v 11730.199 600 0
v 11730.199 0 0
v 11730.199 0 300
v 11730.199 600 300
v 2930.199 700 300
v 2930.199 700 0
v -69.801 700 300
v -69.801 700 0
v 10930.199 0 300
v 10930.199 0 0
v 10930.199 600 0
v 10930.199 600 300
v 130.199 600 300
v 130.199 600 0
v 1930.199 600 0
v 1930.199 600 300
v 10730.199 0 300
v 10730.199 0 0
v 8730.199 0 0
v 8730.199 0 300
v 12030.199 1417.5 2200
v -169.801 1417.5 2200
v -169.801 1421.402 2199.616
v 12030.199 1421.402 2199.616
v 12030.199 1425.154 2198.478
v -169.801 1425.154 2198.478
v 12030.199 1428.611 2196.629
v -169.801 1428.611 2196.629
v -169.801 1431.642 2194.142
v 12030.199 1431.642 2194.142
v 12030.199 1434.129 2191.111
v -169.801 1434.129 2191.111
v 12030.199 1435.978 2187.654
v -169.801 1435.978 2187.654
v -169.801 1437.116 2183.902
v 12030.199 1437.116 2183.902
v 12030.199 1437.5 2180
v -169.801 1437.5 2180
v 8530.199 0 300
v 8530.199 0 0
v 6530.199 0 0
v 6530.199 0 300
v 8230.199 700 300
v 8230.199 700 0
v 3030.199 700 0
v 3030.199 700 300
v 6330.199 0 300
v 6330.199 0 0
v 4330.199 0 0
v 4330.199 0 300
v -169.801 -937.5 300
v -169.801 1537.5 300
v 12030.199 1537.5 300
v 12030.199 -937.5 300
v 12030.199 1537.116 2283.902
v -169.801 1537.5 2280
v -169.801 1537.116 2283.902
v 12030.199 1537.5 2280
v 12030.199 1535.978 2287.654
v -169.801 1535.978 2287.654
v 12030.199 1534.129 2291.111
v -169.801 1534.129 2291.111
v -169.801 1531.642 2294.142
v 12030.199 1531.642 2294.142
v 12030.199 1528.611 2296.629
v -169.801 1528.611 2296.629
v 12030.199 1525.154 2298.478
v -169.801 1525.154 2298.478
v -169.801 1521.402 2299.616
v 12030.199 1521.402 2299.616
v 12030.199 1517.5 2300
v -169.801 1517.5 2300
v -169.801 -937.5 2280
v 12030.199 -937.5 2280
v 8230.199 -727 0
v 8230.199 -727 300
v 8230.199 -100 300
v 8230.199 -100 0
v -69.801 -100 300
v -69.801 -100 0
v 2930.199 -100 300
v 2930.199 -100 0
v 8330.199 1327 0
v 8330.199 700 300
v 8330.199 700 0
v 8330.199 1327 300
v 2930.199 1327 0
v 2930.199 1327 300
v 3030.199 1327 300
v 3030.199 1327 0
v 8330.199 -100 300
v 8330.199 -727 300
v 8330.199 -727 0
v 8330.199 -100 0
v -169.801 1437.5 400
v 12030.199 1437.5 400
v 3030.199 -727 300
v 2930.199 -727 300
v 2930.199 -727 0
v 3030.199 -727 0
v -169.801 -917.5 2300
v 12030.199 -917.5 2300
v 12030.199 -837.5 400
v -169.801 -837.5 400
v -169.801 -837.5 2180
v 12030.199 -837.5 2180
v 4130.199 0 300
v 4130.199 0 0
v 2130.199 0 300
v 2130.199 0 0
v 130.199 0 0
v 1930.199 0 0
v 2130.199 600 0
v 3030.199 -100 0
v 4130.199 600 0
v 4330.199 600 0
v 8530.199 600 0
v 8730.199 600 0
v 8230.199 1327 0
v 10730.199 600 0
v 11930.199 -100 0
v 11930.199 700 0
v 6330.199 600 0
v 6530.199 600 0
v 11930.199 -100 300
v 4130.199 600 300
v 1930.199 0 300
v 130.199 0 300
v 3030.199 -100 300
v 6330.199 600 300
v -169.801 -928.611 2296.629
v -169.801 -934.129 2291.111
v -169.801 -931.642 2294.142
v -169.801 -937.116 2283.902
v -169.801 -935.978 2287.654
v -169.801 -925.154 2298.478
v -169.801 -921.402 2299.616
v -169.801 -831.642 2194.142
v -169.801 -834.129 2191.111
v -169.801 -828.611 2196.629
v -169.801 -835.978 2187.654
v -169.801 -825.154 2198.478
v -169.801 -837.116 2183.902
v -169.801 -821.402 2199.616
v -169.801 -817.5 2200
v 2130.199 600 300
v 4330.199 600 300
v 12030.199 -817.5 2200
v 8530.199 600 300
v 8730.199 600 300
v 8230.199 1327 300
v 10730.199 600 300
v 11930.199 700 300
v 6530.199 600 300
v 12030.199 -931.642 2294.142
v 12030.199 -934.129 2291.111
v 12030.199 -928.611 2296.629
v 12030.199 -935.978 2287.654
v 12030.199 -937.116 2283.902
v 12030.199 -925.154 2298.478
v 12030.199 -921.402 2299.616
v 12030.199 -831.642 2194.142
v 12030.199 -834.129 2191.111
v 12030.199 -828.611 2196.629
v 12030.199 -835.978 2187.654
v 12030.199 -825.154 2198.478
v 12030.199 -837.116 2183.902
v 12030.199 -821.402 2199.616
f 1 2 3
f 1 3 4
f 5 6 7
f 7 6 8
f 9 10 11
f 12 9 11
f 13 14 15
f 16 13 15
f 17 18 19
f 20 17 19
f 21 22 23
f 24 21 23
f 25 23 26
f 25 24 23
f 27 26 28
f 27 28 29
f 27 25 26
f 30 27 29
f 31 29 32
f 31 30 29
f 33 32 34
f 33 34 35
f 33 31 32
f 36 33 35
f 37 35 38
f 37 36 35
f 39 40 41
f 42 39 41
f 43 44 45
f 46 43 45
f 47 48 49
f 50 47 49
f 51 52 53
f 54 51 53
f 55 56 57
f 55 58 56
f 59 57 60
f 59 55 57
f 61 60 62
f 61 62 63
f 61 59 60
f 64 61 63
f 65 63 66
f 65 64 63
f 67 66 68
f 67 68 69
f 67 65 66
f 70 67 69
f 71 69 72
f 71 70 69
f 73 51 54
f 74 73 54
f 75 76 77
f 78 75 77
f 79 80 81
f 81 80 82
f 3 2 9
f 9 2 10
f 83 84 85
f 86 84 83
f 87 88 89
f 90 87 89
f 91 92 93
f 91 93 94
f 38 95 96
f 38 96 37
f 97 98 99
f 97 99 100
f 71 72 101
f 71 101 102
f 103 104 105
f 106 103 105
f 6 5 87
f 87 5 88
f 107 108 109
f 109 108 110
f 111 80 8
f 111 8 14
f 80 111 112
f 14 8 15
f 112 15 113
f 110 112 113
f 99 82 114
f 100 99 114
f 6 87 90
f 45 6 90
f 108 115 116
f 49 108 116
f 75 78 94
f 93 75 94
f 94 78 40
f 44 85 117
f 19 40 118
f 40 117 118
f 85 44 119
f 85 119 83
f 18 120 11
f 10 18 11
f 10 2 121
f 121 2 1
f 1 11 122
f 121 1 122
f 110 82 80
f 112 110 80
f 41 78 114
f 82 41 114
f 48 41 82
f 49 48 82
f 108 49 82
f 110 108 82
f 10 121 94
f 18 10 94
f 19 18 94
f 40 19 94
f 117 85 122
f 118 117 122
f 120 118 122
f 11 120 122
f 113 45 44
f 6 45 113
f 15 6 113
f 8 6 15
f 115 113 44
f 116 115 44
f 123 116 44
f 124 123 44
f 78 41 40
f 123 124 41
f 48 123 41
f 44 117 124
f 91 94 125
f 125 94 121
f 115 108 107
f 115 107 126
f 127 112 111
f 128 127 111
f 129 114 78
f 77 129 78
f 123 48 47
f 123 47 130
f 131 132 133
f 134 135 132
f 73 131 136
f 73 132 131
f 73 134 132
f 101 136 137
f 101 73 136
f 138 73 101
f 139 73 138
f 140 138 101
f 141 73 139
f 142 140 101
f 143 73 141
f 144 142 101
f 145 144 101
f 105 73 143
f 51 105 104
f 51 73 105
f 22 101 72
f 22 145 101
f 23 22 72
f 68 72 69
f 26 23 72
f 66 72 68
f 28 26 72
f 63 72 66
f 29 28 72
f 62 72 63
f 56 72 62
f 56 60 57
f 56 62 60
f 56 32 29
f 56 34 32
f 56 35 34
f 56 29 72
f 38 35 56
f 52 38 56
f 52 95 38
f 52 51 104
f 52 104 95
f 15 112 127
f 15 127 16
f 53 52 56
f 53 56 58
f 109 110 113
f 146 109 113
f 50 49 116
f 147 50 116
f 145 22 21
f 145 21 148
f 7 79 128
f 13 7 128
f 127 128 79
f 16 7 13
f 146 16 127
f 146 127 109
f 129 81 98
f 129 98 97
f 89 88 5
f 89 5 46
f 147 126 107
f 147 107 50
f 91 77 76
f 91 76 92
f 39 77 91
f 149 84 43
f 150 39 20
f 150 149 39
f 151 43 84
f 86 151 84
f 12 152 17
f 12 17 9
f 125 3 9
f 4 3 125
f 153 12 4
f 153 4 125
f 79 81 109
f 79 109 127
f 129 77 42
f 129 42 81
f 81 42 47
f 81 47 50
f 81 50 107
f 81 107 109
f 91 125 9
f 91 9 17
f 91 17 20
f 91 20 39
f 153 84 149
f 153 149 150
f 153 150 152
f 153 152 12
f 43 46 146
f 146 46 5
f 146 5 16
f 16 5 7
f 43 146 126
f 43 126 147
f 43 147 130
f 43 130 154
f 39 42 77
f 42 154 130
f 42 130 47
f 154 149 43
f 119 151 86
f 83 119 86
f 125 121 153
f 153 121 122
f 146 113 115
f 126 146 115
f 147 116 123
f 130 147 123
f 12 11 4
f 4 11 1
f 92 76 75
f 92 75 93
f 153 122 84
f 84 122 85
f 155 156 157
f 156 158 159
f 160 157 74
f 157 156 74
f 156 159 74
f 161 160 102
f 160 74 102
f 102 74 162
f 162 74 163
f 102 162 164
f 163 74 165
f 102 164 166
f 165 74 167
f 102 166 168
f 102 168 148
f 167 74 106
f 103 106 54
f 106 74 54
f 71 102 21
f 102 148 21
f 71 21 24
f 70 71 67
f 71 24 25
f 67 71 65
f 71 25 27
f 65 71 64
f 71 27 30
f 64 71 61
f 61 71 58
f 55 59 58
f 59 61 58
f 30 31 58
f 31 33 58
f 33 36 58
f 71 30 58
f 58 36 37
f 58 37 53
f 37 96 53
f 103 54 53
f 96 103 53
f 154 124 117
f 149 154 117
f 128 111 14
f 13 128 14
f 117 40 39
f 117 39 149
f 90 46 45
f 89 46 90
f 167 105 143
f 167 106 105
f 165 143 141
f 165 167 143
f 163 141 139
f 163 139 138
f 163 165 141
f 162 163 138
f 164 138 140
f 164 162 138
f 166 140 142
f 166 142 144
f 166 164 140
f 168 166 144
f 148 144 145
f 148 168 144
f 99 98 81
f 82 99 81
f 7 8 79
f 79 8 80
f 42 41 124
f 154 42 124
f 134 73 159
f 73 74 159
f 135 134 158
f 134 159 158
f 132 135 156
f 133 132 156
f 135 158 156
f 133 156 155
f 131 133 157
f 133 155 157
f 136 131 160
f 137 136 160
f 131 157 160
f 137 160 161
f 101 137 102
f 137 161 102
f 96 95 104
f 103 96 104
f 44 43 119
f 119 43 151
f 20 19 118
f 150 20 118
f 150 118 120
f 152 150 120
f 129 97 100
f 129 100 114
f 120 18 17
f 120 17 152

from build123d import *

# Parameters (mm, degrees)
F0_W     = 200
F0_H     = 600
F1_DEPTH = 300
F2_W     = 100
F2_H     = 627
F3_DEPTH = 300
F4_W     = 12200
F4_H     = 2475
F4_W_2   = 1800
F4_H_2   = 600
F4_W_3   = 2000
F4_W_4   = 800
F5_DEPTH = 2000
F6_R     = 20
F7_W     = 2275
F7_H     = 1800
F8_DEPTH = 12500
F9_R     = 20


with BuildPart() as f1:
    # F0 (on Top) → F1 (new body)
    with BuildSketch(Plane.XY):
        with Locations((30.1989898086, 300)):
            Rectangle(F0_W, F0_H)
        with Locations((2030.1989898086, 300)):
            Rectangle(F0_W, F0_H)
        Polygon((130.1989898086, 0), (-69.8010101914, 0), (-69.8010101914, -100), (11930.1989898086, -100), (11930.1989898086, 0), (11730.1989898086, 0), (10930.1989898086, 0), (10730.1989898086, 0), (8730.1989898086, 0), (8530.1989898086, 0), (6530.1989898086, 0), (6330.1989898086, 0), (4330.1989898086, 0), (4130.1989898086, 0), (2130.1989898086, 0), (1930.1989898086, 0), align=None)
        Polygon((-69.8010101914, 700), (-69.8010101914, 600), (130.1989898086, 600), (1930.1989898086, 600), (2130.1989898086, 600), (4130.1989898086, 600), (4330.1989898086, 600), (6330.1989898086, 600), (6530.1989898086, 600), (8530.1989898086, 600), (8730.1989898086, 600), (10730.1989898086, 600), (10930.1989898086, 600), (11730.1989898086, 600), (11930.1989898086, 600), (11930.1989898086, 700), align=None)
        with Locations((4230.1989898086, 300)):
            Rectangle(F0_W, F0_H)
        with Locations((6430.1989898086, 300)):
            Rectangle(F0_W, F0_H)
        with Locations((8630.1989898086, 300)):
            Rectangle(F0_W, F0_H)
        with Locations((10830.1989898086, 300)):
            Rectangle(F0_W, F0_H)
        with Locations((11830.1989898086, 300)):
            Rectangle(F0_W, F0_H)
    extrude(amount=F1_DEPTH)

    # F2 (on face) → F3 (join)
    with BuildSketch(Plane.XY.offset(300)):
        with Locations((2980.1989898086, -413.5)):
            Rectangle(F2_W, F2_H)
        with Locations((2980.1989898086, 1013.5)):
            Rectangle(F2_W, F2_H)
        with Locations((8280.1989898086, -413.5)):
            Rectangle(F2_W, F2_H)
        with Locations((8280.1989898086, 1013.5)):
            Rectangle(F2_W, F2_H)
    extrude(amount=-F3_DEPTH)


with BuildPart() as f5:
    # F4 (on face) → F5 (new body)
    with BuildSketch(Plane.XY.offset(300)):
        with Locations((5930.1989898086, 300)):
            Rectangle(F4_W, F4_H)
        Polygon((2930.1989898086, -100), (-69.8010101914, -100), (-69.8010101914, 700), (2930.1989898086, 700), (2930.1989898086, 1327), (3030.1989898086, 1327), (3030.1989898086, 700), (8230.1989898086, 700), (8230.1989898086, 1327), (8330.1989898086, 1327), (8330.1989898086, 700), (11930.1989898086, 700), (11930.1989898086, -100), (8330.1989898086, -100), (8330.1989898086, -727), (8230.1989898086, -727), (8230.1989898086, -100), (3030.1989898086, -100), (3030.1989898086, -727), (2930.1989898086, -727), align=None, mode=Mode.SUBTRACT)
        Polygon((-69.8010101914, 700), (-69.8010101914, -100), (2930.1989898086, -100), (2930.1989898086, -727), (3030.1989898086, -727), (3030.1989898086, -100), (8230.1989898086, -100), (8230.1989898086, -727), (8330.1989898086, -727), (8330.1989898086, -100), (11930.1989898086, -100), (11930.1989898086, 700), (8330.1989898086, 700), (8330.1989898086, 1327), (8230.1989898086, 1327), (8230.1989898086, 700), (3030.1989898086, 700), (3030.1989898086, 1327), (2930.1989898086, 1327), (2930.1989898086, 700), align=None)
        with Locations((1030.1989898086, 300)):
            Rectangle(F4_W_2, F4_H_2, mode=Mode.SUBTRACT)
        with Locations((3130.1989898086, 300)):
            Rectangle(F4_W_3, F4_H_2, mode=Mode.SUBTRACT)
        with Locations((5330.1989898086, 300)):
            Rectangle(F4_W_3, F4_H_2, mode=Mode.SUBTRACT)
        with Locations((7530.1989898086, 300)):
            Rectangle(F4_W_3, F4_H_2, mode=Mode.SUBTRACT)
        with Locations((9730.1989898086, 300)):
            Rectangle(F4_W_3, F4_H_2, mode=Mode.SUBTRACT)
        with Locations((11330.1989898086, 300)):
            Rectangle(F4_W_4, F4_H_2, mode=Mode.SUBTRACT)
        with Locations((5330.1989898086, 300)):
            Rectangle(F4_W_3, F4_H_2)
        with Locations((3130.1989898086, 300)):
            Rectangle(F4_W_3, F4_H_2)
        with Locations((7530.1989898086, 300)):
            Rectangle(F4_W_3, F4_H_2)
        with Locations((1030.1989898086, 300)):
            Rectangle(F4_W_2, F4_H_2)
        with Locations((9730.1989898086, 300)):
            Rectangle(F4_W_3, F4_H_2)
        with Locations((11330.1989898086, 300)):
            Rectangle(F4_W_4, F4_H_2)
    extrude(amount=F5_DEPTH)

    # F6
    f6_edges = [f5.edges().sort_by_distance(p)[0] for p in [
        (5930.19899, 1537.5, 2300),
        (5930.19899, -937.5, 2300),
    ]]
    fillet(f6_edges, radius=F6_R)

    # F7 (on face) → F8 (cut)
    with BuildSketch(Plane(origin=(-169.8010101914, 0, 0), x_dir=(0, -1, 0), z_dir=(-1, 0, 0))):
        with Locations((-300, 1300)):
            Rectangle(F7_W, F7_H)
    extrude(amount=-F8_DEPTH, mode=Mode.SUBTRACT)

    # F9
    f9_edges = [f5.edges().sort_by_distance(p)[0] for p in [
        (5930.19899, 1437.5, 2200),
        (5930.19899, -837.5, 2200),
    ]]
    fillet(f9_edges, radius=F9_R)


solid = Compound([f1.part, f5.part])
